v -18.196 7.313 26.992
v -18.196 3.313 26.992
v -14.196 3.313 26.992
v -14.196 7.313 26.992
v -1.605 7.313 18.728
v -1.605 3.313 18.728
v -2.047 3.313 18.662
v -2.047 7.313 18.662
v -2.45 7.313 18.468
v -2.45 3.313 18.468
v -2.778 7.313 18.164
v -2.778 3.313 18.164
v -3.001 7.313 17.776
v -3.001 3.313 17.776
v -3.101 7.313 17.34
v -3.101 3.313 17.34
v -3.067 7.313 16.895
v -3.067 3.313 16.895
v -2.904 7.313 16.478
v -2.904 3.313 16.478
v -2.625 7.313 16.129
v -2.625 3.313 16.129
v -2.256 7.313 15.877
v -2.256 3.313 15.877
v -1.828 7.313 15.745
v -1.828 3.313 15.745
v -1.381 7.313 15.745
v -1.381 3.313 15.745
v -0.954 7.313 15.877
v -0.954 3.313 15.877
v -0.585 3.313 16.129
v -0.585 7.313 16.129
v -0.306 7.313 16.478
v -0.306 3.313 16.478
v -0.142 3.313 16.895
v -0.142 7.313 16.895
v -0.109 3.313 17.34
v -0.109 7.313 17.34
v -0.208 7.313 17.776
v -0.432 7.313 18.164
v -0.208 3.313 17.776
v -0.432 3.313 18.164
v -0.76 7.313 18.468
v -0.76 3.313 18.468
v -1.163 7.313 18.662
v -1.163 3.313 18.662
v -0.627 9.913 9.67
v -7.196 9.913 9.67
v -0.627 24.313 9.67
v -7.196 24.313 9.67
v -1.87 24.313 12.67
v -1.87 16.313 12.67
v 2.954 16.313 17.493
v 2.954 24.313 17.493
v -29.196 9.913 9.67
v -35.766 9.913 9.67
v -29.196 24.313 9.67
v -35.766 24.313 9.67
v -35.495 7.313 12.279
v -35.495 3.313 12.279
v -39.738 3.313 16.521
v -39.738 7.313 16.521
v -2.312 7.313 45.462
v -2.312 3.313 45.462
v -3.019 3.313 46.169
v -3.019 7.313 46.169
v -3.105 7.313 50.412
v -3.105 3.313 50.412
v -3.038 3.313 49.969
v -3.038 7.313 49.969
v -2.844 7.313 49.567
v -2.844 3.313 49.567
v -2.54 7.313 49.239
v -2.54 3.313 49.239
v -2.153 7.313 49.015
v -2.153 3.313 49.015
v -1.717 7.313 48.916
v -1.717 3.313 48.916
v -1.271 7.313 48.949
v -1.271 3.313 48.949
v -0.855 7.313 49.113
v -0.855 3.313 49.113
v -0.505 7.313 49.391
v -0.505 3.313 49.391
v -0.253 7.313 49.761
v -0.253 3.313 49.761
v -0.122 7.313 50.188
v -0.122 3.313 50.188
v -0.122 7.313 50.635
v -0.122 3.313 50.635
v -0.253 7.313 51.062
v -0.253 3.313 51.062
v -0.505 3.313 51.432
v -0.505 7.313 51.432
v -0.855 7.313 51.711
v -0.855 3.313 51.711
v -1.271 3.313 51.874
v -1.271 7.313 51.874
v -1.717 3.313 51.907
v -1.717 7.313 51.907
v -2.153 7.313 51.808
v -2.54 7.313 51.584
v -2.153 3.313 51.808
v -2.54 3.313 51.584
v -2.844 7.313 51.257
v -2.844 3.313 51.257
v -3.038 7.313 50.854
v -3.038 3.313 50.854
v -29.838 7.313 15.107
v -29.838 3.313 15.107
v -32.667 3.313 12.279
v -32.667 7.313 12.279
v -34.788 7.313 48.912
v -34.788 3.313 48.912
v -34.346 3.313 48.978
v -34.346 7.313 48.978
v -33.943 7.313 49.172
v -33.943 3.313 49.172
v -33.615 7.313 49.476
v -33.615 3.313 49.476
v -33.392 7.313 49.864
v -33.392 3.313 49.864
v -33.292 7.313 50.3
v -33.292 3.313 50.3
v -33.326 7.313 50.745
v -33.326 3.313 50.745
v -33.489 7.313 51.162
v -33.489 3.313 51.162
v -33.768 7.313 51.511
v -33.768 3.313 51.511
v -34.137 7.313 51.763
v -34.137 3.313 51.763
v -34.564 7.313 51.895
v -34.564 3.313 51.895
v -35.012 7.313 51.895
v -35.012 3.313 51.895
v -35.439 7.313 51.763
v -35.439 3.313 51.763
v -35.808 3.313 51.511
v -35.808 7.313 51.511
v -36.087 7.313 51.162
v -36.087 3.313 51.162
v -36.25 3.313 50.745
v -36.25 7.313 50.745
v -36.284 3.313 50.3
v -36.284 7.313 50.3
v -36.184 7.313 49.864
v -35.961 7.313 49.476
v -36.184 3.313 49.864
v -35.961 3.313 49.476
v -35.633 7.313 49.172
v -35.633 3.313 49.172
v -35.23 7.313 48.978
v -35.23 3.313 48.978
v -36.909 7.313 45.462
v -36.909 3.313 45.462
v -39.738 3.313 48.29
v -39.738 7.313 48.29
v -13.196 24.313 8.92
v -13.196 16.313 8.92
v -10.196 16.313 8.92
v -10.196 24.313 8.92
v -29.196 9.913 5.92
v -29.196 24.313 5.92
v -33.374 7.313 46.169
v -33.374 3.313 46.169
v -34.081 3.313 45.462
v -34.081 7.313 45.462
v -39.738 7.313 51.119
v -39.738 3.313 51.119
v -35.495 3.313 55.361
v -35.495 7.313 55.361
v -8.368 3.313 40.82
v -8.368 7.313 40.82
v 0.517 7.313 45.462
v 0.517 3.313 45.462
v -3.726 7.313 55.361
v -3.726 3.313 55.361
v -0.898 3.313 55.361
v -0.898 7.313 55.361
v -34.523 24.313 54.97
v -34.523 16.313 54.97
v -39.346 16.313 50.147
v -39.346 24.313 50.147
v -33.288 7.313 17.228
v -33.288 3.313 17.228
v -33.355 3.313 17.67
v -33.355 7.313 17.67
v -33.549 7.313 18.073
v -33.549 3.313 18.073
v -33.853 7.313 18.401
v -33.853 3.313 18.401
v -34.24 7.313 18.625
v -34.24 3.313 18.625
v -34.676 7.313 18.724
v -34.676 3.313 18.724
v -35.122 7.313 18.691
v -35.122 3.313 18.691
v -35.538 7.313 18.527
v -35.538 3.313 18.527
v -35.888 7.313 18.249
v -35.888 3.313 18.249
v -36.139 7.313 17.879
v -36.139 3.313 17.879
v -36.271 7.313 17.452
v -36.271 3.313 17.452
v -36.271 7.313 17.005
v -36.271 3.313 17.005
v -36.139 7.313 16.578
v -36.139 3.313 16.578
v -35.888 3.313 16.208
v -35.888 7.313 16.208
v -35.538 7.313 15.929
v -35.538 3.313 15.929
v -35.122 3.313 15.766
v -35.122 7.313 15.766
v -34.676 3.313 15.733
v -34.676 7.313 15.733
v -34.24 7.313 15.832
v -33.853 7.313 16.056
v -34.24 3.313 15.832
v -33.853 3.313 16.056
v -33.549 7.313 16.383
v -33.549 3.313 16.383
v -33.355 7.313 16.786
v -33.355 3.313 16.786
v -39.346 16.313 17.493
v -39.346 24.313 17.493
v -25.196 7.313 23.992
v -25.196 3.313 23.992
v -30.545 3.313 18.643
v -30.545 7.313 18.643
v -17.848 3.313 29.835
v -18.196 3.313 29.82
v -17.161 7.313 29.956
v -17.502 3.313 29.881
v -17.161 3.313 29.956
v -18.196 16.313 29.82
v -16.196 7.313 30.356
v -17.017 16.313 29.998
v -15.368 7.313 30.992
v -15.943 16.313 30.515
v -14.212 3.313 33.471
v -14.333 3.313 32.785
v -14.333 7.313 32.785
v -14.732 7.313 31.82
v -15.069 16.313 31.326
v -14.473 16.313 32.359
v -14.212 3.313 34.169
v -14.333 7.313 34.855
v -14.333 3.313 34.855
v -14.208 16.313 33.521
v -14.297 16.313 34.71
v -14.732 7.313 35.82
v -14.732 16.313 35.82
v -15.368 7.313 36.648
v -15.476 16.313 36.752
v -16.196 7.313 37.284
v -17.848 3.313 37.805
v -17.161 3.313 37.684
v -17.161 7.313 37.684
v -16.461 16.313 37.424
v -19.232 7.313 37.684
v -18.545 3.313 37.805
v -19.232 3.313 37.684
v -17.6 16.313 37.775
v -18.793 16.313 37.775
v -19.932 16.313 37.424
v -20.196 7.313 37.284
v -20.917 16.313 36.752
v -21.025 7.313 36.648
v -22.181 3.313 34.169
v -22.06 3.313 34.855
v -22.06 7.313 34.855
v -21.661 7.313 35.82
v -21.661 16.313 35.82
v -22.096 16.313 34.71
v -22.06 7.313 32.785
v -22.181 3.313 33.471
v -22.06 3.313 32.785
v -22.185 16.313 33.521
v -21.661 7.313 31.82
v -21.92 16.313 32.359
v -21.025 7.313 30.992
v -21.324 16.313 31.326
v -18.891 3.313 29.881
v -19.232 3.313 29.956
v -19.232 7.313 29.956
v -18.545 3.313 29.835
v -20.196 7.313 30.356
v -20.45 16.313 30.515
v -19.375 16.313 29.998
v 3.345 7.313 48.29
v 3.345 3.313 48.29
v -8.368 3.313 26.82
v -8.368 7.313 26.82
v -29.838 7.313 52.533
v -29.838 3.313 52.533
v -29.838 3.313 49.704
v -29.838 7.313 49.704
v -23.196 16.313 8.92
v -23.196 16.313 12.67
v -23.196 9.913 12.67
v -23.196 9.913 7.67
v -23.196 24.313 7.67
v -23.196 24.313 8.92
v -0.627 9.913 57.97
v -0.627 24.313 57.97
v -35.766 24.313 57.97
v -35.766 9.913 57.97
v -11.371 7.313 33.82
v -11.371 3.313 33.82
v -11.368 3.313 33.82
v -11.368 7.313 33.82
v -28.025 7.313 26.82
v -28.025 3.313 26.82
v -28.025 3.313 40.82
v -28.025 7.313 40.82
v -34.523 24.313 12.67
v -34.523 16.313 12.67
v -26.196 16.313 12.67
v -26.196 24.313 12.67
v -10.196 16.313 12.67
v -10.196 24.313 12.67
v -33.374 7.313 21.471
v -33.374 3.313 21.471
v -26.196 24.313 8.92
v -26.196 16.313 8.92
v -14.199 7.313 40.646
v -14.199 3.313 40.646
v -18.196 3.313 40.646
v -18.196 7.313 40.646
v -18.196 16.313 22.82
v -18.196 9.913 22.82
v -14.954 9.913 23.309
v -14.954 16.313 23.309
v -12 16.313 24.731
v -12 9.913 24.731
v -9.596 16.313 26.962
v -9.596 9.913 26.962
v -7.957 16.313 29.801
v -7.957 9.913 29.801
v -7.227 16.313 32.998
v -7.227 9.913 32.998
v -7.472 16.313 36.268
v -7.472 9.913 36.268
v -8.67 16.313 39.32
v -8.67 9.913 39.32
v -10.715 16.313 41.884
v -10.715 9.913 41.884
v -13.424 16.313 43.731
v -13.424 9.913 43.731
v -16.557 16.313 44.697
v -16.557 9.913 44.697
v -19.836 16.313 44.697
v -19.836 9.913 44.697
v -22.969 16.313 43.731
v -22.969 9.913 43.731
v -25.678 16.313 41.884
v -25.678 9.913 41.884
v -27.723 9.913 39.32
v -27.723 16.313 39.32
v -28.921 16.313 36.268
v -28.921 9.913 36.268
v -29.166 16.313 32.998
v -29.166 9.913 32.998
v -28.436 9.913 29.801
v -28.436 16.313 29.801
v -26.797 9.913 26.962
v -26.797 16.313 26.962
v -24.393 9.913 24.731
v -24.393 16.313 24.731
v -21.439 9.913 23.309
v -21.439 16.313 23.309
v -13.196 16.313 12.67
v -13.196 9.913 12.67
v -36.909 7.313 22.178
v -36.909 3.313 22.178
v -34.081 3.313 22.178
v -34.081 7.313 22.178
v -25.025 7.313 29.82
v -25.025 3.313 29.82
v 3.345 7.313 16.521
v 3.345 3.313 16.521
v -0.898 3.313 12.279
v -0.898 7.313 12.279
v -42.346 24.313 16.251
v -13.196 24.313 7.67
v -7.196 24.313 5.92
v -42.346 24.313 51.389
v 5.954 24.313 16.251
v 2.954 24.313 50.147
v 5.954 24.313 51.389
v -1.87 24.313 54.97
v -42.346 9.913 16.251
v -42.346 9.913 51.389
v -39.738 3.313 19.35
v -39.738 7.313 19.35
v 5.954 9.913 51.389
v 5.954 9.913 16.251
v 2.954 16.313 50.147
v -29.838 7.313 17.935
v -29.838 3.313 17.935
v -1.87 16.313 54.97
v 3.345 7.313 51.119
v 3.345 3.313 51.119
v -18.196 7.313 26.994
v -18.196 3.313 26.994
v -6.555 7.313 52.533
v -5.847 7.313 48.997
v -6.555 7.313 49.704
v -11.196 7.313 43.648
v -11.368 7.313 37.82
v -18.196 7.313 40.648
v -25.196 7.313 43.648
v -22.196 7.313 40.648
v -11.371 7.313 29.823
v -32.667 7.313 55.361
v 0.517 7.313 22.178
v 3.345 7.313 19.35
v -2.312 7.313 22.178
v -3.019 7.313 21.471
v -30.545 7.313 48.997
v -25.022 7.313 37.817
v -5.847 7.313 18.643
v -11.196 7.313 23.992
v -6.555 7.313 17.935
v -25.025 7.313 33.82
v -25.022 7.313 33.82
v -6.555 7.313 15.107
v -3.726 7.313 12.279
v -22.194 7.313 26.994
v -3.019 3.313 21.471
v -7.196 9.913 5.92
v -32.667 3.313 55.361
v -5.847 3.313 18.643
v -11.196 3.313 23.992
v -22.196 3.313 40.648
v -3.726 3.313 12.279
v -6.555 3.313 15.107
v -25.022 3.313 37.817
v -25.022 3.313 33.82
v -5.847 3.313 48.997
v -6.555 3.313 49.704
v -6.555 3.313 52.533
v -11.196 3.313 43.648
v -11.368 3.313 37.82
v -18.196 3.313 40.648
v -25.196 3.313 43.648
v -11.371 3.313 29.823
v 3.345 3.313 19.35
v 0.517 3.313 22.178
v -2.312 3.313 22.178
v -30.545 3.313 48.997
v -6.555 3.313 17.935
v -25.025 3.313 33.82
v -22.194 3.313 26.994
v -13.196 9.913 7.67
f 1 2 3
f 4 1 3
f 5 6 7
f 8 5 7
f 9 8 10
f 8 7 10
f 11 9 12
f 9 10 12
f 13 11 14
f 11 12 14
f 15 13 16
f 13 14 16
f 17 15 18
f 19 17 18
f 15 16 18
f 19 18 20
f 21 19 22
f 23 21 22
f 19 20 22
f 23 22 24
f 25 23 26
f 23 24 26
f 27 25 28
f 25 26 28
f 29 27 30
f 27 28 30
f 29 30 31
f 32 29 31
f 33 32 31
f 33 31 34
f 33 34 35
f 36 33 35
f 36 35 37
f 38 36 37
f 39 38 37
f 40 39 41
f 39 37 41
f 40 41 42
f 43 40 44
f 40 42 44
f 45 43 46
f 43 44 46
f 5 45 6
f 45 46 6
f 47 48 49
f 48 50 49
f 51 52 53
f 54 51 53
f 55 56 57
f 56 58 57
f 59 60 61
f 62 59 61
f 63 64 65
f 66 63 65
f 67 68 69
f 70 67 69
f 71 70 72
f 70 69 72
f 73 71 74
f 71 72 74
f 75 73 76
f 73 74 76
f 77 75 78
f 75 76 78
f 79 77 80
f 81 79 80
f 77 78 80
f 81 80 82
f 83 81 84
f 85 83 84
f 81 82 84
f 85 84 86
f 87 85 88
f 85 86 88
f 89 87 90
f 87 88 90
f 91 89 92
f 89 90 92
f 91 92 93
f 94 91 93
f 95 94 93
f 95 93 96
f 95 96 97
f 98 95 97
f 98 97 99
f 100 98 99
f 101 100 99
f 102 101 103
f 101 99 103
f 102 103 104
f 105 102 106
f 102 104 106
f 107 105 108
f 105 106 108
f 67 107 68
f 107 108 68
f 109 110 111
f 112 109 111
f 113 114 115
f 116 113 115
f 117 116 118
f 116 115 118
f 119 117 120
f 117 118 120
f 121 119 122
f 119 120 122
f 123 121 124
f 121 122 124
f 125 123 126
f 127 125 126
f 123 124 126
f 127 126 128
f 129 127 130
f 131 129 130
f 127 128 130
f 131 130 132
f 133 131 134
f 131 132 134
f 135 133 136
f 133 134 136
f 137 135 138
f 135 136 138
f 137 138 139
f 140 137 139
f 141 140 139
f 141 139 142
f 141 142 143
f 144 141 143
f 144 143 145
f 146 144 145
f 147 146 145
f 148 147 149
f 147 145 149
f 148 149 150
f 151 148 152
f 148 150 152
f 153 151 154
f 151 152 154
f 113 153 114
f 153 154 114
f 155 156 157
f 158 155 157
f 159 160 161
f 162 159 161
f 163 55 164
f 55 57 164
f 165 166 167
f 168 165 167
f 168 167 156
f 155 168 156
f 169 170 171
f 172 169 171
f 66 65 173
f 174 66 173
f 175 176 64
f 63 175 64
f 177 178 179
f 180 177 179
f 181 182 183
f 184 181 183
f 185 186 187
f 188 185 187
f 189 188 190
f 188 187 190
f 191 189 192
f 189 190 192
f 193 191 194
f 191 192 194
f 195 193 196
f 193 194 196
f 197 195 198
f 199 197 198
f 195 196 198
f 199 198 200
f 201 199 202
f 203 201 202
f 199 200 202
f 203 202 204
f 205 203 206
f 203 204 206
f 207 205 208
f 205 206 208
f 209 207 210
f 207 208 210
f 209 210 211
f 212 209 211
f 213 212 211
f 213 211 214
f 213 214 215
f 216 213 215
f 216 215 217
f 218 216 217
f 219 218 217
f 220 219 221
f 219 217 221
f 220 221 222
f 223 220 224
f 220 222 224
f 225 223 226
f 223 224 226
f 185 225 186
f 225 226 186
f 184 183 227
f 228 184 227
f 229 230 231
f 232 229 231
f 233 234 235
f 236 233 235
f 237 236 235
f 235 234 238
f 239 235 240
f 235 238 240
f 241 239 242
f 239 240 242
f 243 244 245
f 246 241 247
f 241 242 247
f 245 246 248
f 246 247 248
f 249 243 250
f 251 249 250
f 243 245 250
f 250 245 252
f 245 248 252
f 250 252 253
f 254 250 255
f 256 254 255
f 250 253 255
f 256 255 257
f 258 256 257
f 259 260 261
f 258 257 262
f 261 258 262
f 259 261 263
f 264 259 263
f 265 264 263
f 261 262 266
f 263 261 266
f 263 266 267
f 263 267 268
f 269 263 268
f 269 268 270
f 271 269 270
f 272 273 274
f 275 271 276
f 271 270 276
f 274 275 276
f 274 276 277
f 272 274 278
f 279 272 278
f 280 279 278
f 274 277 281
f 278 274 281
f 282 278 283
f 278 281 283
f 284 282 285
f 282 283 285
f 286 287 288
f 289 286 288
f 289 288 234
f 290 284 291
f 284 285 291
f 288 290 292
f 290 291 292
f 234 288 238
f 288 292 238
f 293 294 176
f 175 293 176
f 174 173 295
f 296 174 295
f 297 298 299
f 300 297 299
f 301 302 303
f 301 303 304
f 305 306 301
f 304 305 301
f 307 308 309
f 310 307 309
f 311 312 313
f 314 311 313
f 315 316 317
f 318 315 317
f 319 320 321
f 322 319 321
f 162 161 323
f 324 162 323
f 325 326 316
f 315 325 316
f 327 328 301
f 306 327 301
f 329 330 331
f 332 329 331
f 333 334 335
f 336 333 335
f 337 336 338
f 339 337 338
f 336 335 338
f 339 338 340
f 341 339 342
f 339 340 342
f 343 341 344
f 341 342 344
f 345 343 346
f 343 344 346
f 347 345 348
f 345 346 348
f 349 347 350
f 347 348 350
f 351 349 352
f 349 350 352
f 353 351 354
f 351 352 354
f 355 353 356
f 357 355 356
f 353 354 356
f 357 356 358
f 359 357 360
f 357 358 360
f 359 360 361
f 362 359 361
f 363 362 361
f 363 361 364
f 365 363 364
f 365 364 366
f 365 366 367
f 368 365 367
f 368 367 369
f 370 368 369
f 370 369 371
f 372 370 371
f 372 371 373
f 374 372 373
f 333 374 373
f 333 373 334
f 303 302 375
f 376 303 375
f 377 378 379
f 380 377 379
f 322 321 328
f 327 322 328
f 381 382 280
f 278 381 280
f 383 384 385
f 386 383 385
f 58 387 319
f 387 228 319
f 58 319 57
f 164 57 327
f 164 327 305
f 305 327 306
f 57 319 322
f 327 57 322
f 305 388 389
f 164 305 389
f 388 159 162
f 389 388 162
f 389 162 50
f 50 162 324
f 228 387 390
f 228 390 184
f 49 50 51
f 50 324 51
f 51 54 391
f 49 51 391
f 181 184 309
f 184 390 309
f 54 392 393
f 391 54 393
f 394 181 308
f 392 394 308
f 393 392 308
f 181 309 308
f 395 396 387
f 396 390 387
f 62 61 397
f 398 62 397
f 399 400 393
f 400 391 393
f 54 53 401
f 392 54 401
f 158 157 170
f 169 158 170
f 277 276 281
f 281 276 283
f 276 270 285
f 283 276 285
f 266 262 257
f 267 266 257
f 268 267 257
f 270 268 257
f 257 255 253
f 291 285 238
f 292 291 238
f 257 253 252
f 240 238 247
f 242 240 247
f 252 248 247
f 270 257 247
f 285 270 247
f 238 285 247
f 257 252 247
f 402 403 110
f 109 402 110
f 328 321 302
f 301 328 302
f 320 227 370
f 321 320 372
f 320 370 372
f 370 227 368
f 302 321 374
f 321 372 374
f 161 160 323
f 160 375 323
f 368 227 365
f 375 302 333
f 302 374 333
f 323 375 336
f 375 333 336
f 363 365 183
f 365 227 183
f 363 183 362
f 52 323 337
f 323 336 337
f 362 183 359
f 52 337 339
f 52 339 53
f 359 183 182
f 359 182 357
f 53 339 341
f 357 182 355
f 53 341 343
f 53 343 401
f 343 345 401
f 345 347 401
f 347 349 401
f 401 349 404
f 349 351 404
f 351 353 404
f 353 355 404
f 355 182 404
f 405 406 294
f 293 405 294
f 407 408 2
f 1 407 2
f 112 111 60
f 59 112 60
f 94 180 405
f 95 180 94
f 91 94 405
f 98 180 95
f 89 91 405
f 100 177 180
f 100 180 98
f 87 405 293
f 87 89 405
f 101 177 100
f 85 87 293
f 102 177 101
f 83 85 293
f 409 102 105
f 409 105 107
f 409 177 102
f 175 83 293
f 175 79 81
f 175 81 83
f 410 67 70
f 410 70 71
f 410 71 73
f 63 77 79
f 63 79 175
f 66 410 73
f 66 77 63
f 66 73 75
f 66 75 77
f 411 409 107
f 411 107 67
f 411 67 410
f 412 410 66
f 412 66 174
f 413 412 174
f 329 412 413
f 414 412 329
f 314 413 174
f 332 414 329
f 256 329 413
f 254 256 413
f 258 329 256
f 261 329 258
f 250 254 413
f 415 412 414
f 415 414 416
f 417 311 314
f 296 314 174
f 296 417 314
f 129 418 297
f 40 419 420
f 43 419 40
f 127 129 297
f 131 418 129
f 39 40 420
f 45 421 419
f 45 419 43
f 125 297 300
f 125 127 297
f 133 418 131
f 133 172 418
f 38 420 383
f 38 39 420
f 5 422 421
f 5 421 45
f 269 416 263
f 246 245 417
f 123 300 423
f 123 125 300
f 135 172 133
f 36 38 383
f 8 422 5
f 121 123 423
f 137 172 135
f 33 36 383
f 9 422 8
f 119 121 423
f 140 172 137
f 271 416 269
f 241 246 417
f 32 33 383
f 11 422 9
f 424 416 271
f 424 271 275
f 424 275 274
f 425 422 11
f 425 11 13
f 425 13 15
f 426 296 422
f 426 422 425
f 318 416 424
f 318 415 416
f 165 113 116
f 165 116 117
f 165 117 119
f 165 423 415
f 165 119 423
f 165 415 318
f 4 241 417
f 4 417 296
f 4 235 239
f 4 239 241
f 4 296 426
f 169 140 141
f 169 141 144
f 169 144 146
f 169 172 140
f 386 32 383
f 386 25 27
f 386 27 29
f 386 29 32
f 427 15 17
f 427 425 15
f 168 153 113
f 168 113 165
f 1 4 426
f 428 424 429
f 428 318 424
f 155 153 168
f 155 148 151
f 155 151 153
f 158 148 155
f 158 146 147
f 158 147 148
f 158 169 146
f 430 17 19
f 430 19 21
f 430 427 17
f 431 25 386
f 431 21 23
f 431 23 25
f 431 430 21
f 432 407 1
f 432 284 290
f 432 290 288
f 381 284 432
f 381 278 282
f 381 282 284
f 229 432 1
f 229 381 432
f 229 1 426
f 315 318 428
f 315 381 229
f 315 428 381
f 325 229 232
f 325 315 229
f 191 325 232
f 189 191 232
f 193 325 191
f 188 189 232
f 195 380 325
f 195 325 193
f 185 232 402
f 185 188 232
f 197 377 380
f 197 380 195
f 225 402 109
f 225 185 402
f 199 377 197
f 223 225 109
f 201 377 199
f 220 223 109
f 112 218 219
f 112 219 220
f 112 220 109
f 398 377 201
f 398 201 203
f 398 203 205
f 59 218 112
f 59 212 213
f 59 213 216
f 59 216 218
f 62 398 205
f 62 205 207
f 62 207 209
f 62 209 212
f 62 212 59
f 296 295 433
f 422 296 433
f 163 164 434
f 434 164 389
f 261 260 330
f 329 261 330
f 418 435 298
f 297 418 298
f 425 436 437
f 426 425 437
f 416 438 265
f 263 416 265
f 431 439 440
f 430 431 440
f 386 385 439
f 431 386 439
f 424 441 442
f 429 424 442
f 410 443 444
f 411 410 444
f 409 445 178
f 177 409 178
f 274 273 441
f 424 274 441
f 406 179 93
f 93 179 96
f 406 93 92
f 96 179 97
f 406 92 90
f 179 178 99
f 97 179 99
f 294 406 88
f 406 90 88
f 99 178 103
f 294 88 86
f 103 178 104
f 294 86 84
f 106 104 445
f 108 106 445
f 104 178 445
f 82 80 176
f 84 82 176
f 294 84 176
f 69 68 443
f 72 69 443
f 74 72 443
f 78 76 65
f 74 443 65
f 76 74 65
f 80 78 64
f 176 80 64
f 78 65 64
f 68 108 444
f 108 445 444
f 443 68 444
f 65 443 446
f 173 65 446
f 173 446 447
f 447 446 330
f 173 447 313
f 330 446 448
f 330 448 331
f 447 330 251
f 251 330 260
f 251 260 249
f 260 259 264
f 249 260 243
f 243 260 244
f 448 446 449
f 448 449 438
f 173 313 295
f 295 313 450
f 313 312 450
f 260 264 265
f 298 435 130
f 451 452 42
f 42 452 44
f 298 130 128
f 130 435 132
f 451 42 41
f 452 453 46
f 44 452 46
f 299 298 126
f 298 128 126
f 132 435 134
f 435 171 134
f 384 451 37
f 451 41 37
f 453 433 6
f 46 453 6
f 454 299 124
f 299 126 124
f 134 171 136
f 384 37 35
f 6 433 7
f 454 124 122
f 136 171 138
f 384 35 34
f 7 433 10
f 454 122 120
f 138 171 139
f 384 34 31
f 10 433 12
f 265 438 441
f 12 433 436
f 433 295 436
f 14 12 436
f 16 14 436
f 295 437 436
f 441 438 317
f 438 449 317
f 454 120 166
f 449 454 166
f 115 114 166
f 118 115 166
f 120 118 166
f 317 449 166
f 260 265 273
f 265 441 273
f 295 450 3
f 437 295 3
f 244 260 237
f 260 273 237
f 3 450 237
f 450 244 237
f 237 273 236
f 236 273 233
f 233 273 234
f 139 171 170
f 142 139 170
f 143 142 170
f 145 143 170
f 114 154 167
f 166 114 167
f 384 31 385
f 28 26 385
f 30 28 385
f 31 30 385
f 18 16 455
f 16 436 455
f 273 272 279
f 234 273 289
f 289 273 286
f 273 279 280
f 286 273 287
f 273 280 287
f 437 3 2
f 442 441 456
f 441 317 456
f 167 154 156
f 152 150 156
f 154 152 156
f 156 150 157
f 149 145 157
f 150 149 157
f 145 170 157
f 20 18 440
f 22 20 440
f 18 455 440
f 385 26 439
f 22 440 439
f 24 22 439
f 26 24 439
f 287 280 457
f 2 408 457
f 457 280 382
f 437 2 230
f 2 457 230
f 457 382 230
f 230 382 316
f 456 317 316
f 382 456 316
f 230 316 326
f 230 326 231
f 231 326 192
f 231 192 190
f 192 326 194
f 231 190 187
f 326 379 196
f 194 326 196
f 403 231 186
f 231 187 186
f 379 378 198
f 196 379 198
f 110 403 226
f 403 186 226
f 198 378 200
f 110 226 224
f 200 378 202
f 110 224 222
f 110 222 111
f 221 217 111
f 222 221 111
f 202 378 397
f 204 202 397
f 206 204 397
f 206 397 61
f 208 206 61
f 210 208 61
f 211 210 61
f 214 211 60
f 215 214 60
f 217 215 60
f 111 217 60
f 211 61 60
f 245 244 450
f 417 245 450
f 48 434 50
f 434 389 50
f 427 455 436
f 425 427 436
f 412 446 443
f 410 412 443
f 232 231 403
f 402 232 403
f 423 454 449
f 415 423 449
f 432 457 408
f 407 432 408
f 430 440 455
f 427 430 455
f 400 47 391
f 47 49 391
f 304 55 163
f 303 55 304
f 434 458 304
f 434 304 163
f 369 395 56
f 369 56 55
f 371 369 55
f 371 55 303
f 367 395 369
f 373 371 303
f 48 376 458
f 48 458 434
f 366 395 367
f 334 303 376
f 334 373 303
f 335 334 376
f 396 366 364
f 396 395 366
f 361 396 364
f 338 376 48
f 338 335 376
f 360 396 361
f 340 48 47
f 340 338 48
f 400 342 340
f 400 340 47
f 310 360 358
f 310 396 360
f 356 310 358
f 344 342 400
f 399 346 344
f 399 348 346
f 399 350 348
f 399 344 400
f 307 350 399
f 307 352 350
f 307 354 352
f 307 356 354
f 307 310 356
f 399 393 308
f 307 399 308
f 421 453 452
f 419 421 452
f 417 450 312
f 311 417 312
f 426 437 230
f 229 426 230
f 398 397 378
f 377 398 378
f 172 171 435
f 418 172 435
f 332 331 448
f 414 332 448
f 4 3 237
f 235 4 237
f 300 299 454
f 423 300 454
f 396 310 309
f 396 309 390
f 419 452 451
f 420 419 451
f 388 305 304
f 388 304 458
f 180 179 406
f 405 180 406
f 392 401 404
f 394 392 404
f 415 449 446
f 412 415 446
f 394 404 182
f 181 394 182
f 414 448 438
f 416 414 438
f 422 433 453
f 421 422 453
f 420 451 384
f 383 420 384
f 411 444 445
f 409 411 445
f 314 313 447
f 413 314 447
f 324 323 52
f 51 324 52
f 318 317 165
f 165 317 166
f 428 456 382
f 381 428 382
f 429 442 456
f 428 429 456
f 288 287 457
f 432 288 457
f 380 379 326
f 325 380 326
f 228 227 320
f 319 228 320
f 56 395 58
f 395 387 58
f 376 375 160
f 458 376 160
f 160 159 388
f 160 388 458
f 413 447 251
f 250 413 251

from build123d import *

# Parameters (mm, degrees)
BOSS_EXTRUDE1_DEPTH = 8
BOSS_EXTRUDE2_DEPTH = 6.4
SKETCH4_R           = 11
CUT_EXTRUDE1_DEPTH  = 13
SKETCH5_R           = 4
BOSS_EXTRUDE3_DEPTH = 13
SKETCH6_R           = 1.5
BOSS_EXTRUDE4_DEPTH = 4
CIRPATTERN2_COUNT   = 4
SKETCH8_W           = 10
SKETCH8_H           = 5
CUT_EXTRUDE2_DEPTH  = 19


with BuildPart() as part:
    # Sketch1 → Boss-Extrude1 (new body)
    with BuildSketch(Plane.XZ.offset(-16.312689454)):
        Polygon((-42.346407377, 51.389271206), (-42.346407377, 16.250671026), (-35.765707467, 9.669971116), (-29.196407377, 9.669971116), (-29.196407377, 5.919971116), (-7.196407377, 5.919971116), (-7.196407377, 9.669971116), (-0.627107287, 9.669971116), (5.953592623, 16.250671026), (5.953592623, 51.389271206), (-0.627107287, 57.969971116), (-35.765707467, 57.969971116), align=None)
        Polygon((-10.196407377, 12.669971116), (-1.869747974, 12.669971116), (2.953592623, 17.493311713), (2.953592623, 50.146630519), (-1.869747974, 54.969971116), (-34.52306678, 54.969971116), (-39.346407377, 50.146630519), (-39.346407377, 17.493311713), (-34.52306678, 12.669971116), (-26.196407377, 12.669971116), (-26.196407377, 8.919971116), (-10.196407377, 8.919971116), align=None, mode=Mode.SUBTRACT)
    extrude(amount=-BOSS_EXTRUDE1_DEPTH)

    # Sketch3 → Boss-Extrude2 (add)
    with BuildSketch(Plane.XZ.offset(-16.312689454)):
        Polygon((-35.765707467, 57.969971116), (-42.346407377, 51.389271206), (-42.346407377, 16.250671026), (-35.765707467, 9.669971116), (-29.196407377, 9.669971116), (-29.196407377, 5.919971116), (-7.196407377, 5.919971116), (-7.196407377, 9.669971116), (-0.627107287, 9.669971116), (5.953592623, 16.250671026), (5.953592623, 51.389271206), (-0.627107287, 57.969971116), align=None)
    extrude(amount=BOSS_EXTRUDE2_DEPTH)

    # Sketch4 → Cut-Extrude1 (cut)
    with BuildSketch(Plane.XZ.offset(-9.912689454)):
        with Locations(Location((-18.196407377, 33.819971116, 0), (0, 0, 270))):
            Circle(SKETCH4_R)
    extrude(amount=-CUT_EXTRUDE1_DEPTH, mode=Mode.SUBTRACT)

    # Sketch8 → Cut-Extrude2 (cut)
    with BuildSketch(Plane(origin=(0, 24.312689454, 0), x_dir=(1, 0, 0), z_dir=(0, 1, 0))):
        with Locations((-18.196407377, -10.169971116)):
            Rectangle(SKETCH8_W, SKETCH8_H)
    extrude(amount=-CUT_EXTRUDE2_DEPTH, mode=Mode.SUBTRACT)


with BuildPart() as body_2:
    # Sketch5 → Boss-Extrude3 (new body)
    with BuildSketch(Plane.XZ.offset(-16.312689454)):
        with Locations(Location((-18.196407377, 33.819971116, 0), (0, 0, 270))):
            Circle(SKETCH5_R)
    extrude(amount=BOSS_EXTRUDE3_DEPTH)

    # Sketch6 → Boss-Extrude4 (add)
    with BuildSketch(Plane.XZ.offset(-3.312689454)):
        with BuildLine():
            Line((-22.060110682, 34.855247296), (-25.022114558, 37.817251172))
            Line((-25.022114558, 37.817251172), (-25.022114558, 33.819971116))
            Line((-25.022114558, 33.819971116), (-28.024834502, 33.819971116))
            Line((-28.024834502, 33.819971116), (-28.024834502, 40.819971116))
            Line((-28.024834502, 40.819971116), (-33.373819181, 46.168955795))
            Line((-33.373819181, 46.168955795), (-34.080925962, 45.461849014))
            Line((-34.080925962, 45.461849014), (-36.909353087, 45.461849014))
            Line((-36.909353087, 45.461849014), (-39.737780212, 48.290276139))
            Line((-39.737780212, 48.290276139), (-39.737780212, 51.118703264))
            Line((-39.737780212, 51.118703264), (-35.495139525, 55.361343951))
            Line((-35.495139525, 55.361343951), (-32.6667124, 55.361343951))
            Line((-32.6667124, 55.361343951), (-29.838285275, 52.532916826))
            Line((-29.838285275, 52.532916826), (-29.838285275, 49.704489701))
            Line((-29.838285275, 49.704489701), (-30.545392056, 48.99738292))
            Line((-30.545392056, 48.99738292), (-25.196407377, 43.648398241))
            Line((-25.196407377, 43.648398241), (-18.196407377, 43.648398241))
            Line((-18.196407377, 43.648398241), (-18.196407377, 40.648398241))
            Line((-18.196407377, 40.648398241), (-22.196407377, 40.648398241))
            Line((-22.196407377, 40.648398241), (-19.231683557, 37.683674421))
            ThreePointArc((-19.231683557, 37.683674421), (-21.024834502, 36.648398241), (-22.060110682, 34.855247296))
        make_face()
        with Locations(Location((-34.788032743, 50.411596482, 0), (0, 0, 270))):
            Circle(SKETCH6_R, mode=Mode.SUBTRACT)
    boss_extrude4 = extrude(amount=-BOSS_EXTRUDE4_DEPTH)

    # CirPattern2: Boss-Extrude4 ×4 about axis
    cirpattern2_axis = Axis((-18.196407377, 0, 33.819971116), (0, 1, 0))
    for i in range(1, CIRPATTERN2_COUNT):
        add(boss_extrude4.rotate(cirpattern2_axis, i * 360 / CIRPATTERN2_COUNT))


solid = Compound([part.part, body_2.part])
